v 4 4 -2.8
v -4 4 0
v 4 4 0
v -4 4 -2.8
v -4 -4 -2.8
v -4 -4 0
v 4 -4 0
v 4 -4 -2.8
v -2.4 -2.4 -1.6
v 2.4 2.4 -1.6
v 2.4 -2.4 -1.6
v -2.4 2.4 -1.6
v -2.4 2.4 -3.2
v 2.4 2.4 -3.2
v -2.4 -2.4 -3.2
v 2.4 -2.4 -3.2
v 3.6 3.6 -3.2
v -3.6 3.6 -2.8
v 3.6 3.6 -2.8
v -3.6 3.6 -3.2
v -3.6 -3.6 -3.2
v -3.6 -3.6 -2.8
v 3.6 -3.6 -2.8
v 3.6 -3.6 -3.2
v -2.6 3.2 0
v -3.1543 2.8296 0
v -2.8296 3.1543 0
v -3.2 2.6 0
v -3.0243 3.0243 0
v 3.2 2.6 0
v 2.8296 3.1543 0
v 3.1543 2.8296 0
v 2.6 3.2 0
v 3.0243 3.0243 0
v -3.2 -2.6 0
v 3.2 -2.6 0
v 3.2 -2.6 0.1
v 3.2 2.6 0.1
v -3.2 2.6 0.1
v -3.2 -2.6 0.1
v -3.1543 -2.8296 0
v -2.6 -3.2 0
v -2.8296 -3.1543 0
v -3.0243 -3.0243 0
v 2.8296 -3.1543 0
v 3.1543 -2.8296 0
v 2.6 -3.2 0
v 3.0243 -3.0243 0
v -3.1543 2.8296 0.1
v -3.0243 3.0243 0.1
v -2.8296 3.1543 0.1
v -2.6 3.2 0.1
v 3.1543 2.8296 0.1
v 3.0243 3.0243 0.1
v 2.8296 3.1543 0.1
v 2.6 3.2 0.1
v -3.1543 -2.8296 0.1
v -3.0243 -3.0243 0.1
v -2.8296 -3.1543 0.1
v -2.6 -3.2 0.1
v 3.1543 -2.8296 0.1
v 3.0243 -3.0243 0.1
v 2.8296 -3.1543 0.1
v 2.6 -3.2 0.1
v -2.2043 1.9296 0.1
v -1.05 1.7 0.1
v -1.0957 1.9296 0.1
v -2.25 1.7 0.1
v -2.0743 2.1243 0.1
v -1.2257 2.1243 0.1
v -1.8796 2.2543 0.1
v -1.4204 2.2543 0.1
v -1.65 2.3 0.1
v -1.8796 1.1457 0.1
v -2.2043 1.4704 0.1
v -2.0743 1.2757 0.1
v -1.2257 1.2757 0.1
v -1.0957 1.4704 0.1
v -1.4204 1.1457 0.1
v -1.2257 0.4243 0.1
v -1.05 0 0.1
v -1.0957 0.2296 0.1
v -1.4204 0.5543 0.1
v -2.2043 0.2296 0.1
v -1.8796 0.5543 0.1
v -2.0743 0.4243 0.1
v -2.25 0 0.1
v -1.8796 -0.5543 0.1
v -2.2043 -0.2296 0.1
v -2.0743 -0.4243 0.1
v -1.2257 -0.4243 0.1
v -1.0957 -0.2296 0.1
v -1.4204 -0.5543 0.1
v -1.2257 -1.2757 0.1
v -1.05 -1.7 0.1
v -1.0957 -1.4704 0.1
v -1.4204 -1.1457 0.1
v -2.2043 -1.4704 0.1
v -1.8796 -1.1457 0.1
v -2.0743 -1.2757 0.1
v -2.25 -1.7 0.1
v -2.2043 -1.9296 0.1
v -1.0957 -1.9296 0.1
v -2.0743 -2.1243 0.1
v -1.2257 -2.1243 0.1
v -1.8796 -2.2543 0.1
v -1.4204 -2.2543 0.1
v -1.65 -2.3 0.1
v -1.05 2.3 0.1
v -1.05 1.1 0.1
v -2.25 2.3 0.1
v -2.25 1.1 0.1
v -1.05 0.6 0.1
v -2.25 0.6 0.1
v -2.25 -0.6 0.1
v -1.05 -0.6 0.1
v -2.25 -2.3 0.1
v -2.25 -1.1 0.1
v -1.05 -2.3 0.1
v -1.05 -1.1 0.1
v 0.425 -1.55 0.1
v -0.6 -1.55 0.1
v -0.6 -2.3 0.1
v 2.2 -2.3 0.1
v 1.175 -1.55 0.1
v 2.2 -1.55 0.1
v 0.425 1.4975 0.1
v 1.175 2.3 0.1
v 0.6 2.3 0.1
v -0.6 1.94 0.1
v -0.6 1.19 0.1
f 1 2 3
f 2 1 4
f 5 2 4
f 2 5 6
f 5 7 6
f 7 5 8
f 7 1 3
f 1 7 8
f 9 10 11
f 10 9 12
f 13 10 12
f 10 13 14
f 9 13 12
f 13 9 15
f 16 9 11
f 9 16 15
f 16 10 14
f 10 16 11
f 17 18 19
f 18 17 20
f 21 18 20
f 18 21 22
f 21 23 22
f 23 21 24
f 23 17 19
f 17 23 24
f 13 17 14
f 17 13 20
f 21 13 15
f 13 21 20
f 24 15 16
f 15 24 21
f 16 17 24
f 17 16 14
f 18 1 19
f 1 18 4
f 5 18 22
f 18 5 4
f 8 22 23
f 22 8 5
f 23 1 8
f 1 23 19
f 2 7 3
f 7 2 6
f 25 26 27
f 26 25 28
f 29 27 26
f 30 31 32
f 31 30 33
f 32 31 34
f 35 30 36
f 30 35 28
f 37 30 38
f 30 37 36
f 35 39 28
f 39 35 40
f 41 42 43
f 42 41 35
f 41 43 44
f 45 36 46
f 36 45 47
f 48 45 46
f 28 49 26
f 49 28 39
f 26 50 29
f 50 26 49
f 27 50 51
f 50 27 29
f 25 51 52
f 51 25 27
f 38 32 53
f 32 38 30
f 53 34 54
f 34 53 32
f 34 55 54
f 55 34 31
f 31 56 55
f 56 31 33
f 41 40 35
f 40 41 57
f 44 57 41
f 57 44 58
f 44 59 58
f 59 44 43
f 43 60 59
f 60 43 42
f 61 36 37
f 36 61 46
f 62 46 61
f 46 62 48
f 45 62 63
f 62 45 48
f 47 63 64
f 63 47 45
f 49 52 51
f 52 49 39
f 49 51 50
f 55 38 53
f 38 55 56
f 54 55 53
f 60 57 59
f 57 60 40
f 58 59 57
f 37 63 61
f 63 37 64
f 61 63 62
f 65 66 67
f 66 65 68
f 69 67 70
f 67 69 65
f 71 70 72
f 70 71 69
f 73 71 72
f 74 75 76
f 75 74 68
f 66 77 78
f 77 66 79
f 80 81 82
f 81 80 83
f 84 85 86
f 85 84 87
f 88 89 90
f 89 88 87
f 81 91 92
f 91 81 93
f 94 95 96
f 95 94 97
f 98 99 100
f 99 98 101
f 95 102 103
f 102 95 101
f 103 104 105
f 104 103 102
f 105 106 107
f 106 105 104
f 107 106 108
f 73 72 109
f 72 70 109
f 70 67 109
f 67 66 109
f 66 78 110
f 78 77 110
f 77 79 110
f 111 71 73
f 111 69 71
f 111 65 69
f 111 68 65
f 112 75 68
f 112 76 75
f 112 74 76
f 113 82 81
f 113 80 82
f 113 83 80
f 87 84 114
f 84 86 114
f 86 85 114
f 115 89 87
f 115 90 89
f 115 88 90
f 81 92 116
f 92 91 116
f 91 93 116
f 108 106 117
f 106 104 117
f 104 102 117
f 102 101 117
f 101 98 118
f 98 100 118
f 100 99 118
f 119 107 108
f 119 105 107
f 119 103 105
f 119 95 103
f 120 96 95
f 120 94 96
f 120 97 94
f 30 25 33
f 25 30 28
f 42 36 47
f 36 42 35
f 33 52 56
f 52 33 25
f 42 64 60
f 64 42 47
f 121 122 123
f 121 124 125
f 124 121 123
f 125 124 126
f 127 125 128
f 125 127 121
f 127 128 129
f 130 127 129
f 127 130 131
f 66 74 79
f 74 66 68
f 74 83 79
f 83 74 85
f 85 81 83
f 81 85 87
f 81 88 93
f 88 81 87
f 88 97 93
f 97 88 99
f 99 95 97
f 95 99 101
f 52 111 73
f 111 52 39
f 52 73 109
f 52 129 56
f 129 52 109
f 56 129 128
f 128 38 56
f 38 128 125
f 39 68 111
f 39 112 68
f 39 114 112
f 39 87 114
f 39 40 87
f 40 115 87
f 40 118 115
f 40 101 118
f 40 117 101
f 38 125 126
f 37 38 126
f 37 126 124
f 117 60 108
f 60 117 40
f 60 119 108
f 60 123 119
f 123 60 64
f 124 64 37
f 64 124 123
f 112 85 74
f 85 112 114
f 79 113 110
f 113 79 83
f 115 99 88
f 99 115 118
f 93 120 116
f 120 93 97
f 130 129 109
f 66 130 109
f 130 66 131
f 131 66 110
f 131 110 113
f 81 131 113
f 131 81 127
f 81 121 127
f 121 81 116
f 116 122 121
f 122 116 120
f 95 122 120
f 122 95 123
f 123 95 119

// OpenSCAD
// file: ../p/box5.scad
use <../lib.scad>
function ldraw_lib__box5() = [
// 0 Box with 5 Faces and All Edges
// 0 Name: box5.dat
// 0 Author: James Jessiman
// 0 !LDRAW_ORG Primitive UPDATE 2012-01
// 0 !LICENSE Licensed under CC BY 4.0 : see CAreadme.txt
// 
// 0 BFC CERTIFY CCW
  [0,"BFC","CERTIFY"],
  [0,"BFC","CCW"],
// 
// 0 !HISTORY 2002-04-03 [sbliss] Modified for BFC compliance
// 0 !HISTORY 2002-04-25 [PTadmin] Official Update 2002-02
// 0 !HISTORY 2007-06-24 [PTadmin] Header formatted for Contributor Agreement
// 0 !HISTORY 2008-07-01 [PTadmin] Official Update 2008-01
// 0 !HISTORY 2012-02-16 [Philo] Changed to CCW
// 0 !HISTORY 2012-03-30 [PTadmin] Official Update 2012-01
// 
// 
// 2 24 1 1 1 -1 1 1
  [2,24,1,1,1,-1,1,1],
// 2 24 -1 1 1 -1 1 -1
  [2,24,-1,1,1,-1,1,-1],
// 2 24 -1 1 -1 1 1 -1
  [2,24,-1,1,-1,1,1,-1],
// 2 24 1 1 -1 1 1 1
  [2,24,1,1,-1,1,1,1],
// 2 24 1 0 1 -1 0 1
  [2,24,1,0,1,-1,0,1],
// 2 24 -1 0 1 -1 0 -1
  [2,24,-1,0,1,-1,0,-1],
// 2 24 -1 0 -1 1 0 -1
  [2,24,-1,0,-1,1,0,-1],
// 2 24 1 0 -1 1 0 1
  [2,24,1,0,-1,1,0,1],
// 2 24 1 0 1 1 1 1
  [2,24,1,0,1,1,1,1],
// 2 24 -1 0 1 -1 1 1
  [2,24,-1,0,1,-1,1,1],
// 2 24 1 0 -1 1 1 -1
  [2,24,1,0,-1,1,1,-1],
// 2 24 -1 0 -1 -1 1 -1
  [2,24,-1,0,-1,-1,1,-1],
// 4 16 -1 1 1 1 1 1 1 1 -1 -1 1 -1
  [4,16,-1,1,1,1,1,1,1,1,-1,-1,1,-1],
// 4 16 -1 1 1 -1 0 1 1 0 1 1 1 1
  [4,16,-1,1,1,-1,0,1,1,0,1,1,1,1],
// 4 16 -1 1 -1 -1 0 -1 -1 0 1 -1 1 1
  [4,16,-1,1,-1,-1,0,-1,-1,0,1,-1,1,1],
// 4 16 1 1 -1 1 0 -1 -1 0 -1 -1 1 -1
  [4,16,1,1,-1,1,0,-1,-1,0,-1,-1,1,-1],
// 4 16 1 1 1 1 0 1 1 0 -1 1 1 -1
  [4,16,1,1,1,1,0,1,1,0,-1,1,1,-1],
];
module ldraw_lib__box5(step=0, col=false, unit=2/5, alt=false, line=0.2, solid=!$preview)
    makepoly(ldraw_lib__box5(), step=step, col=col, unit=unit, alt=alt, line=line, solid=solid);
ldraw_lib__box5(line=0.2);
// file: ../p/box4.scad
use <../lib.scad>
function ldraw_lib__box4() = [
// 0 Box with 4 Faces (2 Parallel Pairs) and All Edges
// 0 Name: box4.dat
// 0 Author: James Jessiman
// 0 !LDRAW_ORG Primitive UPDATE 2012-01
// 0 !LICENSE Licensed under CC BY 4.0 : see CAreadme.txt
// 
// 0 BFC CERTIFY CCW
  [0,"BFC","CERTIFY"],
  [0,"BFC","CCW"],
// 
// 0 !HISTORY 2002-04-03 [sbliss] Modified for BFC compliance
// 0 !HISTORY 2002-04-25 [PTadmin] Official Update 2002-02
// 0 !HISTORY 2007-06-24 [PTadmin] Header formatted for Contributor Agreement
// 0 !HISTORY 2008-07-01 [PTadmin] Official Update 2008-01
// 0 !HISTORY 2012-02-16 [Philo] Changed to CCW
// 0 !HISTORY 2012-03-30 [PTadmin] Official Update 2012-01
// 
// 
// 2 24 1 1 1 -1 1 1
  [2,24,1,1,1,-1,1,1],
// 2 24 -1 1 1 -1 1 -1
  [2,24,-1,1,1,-1,1,-1],
// 2 24 -1 1 -1 1 1 -1
  [2,24,-1,1,-1,1,1,-1],
// 2 24 1 1 -1 1 1 1
  [2,24,1,1,-1,1,1,1],
// 2 24 1 0 1 -1 0 1
  [2,24,1,0,1,-1,0,1],
// 2 24 -1 0 1 -1 0 -1
  [2,24,-1,0,1,-1,0,-1],
// 2 24 -1 0 -1 1 0 -1
  [2,24,-1,0,-1,1,0,-1],
// 2 24 1 0 -1 1 0 1
  [2,24,1,0,-1,1,0,1],
// 2 24 1 0 1 1 1 1
  [2,24,1,0,1,1,1,1],
// 2 24 -1 0 1 -1 1 1
  [2,24,-1,0,1,-1,1,1],
// 2 24 1 0 -1 1 1 -1
  [2,24,1,0,-1,1,1,-1],
// 2 24 -1 0 -1 -1 1 -1
  [2,24,-1,0,-1,-1,1,-1],
// 4 16 -1 1 1 -1 0 1 1 0 1 1 1 1
  [4,16,-1,1,1,-1,0,1,1,0,1,1,1,1],
// 4 16 -1 1 -1 -1 0 -1 -1 0 1 -1 1 1
  [4,16,-1,1,-1,-1,0,-1,-1,0,1,-1,1,1],
// 4 16 1 1 -1 1 0 -1 -1 0 -1 -1 1 -1
  [4,16,1,1,-1,1,0,-1,-1,0,-1,-1,1,-1],
// 4 16 1 1 1 1 0 1 1 0 -1 1 1 -1
  [4,16,1,1,1,1,0,1,1,0,-1,1,1,-1],
];
module ldraw_lib__box4(step=0, col=false, unit=2/5, alt=false, line=0.2, solid=!$preview)
    makepoly(ldraw_lib__box4(), step=step, col=col, unit=unit, alt=alt, line=line, solid=solid);
ldraw_lib__box4(line=0.2);
// file: ../p/box3u12.scad
use <../lib.scad>
function ldraw_lib__box3u12() = [
// 0 Box with 3 Parallel Faces without Any Edges
// 0 Name: box3u12.dat
// 0 Author: J.C. Tchang [tchang]
// 0 !LDRAW_ORG Primitive UPDATE 2014-02
// 0 !LICENSE Licensed under CC BY 4.0 : see CAreadme.txt
// 
// 0 BFC CERTIFY CCW
  [0,"BFC","CERTIFY"],
  [0,"BFC","CCW"],
// 
// 0 !HISTORY 2014-12-23 [PTadmin] Official Update 2014-02
// 
// 
// 4 16 -1 1 1 1 1 1 1 1 -1 -1 1 -1
  [4,16,-1,1,1,1,1,1,1,1,-1,-1,1,-1],
// 4 16 -1 1 1 -1 0 1 1 0 1 1 1 1
  [4,16,-1,1,1,-1,0,1,1,0,1,1,1,1],
// 4 16 1 1 -1 1 0 -1 -1 0 -1 -1 1 -1
  [4,16,1,1,-1,1,0,-1,-1,0,-1,-1,1,-1],
];
module ldraw_lib__box3u12(step=0, col=false, unit=2/5, alt=false, line=0.2, solid=!$preview)
    makepoly(ldraw_lib__box3u12(), step=step, col=col, unit=unit, alt=alt, line=line, solid=solid);
ldraw_lib__box3u12(line=0.2);
// file: ../p/7-16ndis.scad
use <../lib.scad>
function ldraw_lib__7_16ndis() = [
// 0 Disc Negative 0.4375
// 0 Name: 7-16ndis.dat
// 0 Author: Alex Taylor [anathema]
// 0 !LDRAW_ORG Primitive UPDATE 2010-01
// 0 !LICENSE Licensed under CC BY 4.0 : see CAreadme.txt
// 
// 0 BFC CERTIFY CCW
  [0,"BFC","CERTIFY"],
  [0,"BFC","CCW"],
// 
// 0 !HISTORY 2010-04-05 [PTadmin] Official Update 2010-01
// 
// 
// 3 16 1 0 1 0.9239 0 0.3827 1 0 0
  [3,16,1,0,1,0.9239,0,0.3827,1,0,0],
// 3 16 1 0 1 0.7071 0 0.7071 0.9239 0 0.3827
  [3,16,1,0,1,0.7071,0,0.7071,0.9239,0,0.3827],
// 3 16 1 0 1 0.3827 0 0.9239 0.7071 0 0.7071
  [3,16,1,0,1,0.3827,0,0.9239,0.7071,0,0.7071],
// 3 16 1 0 1 0 0 1 0.3827 0 0.9239
  [3,16,1,0,1,0,0,1,0.3827,0,0.9239],
// 3 16 -1 0 1 -0.3827 0 0.9239 0 0 1
  [3,16,-1,0,1,-0.3827,0,0.9239,0,0,1],
// 3 16 -1 0 1 -0.7071 0 0.7071 -0.3827 0 0.9239
  [3,16,-1,0,1,-0.7071,0,0.7071,-0.3827,0,0.9239],
// 3 16 -1 0 1 -0.9239 0 0.3827 -0.7071 0 0.7071
  [3,16,-1,0,1,-0.9239,0,0.3827,-0.7071,0,0.7071],
// 0
];
module ldraw_lib__7_16ndis(step=0, col=false, unit=2/5, alt=false, line=0.2, solid=!$preview)
    makepoly(ldraw_lib__7_16ndis(), step=step, col=col, unit=unit, alt=alt, line=line, solid=solid);
ldraw_lib__7_16ndis(line=0.2);
// file: ../p/3-16ndis.scad
use <../lib.scad>
function ldraw_lib__3_16ndis() = [
// 0 Disc Negative 0.1875
// 0 Name: 3-16ndis.dat
// 0 Author: Magnus Forsberg [MagFors]
// 0 !LDRAW_ORG Primitive UPDATE 2024-01
// 0 !LICENSE Licensed under CC BY 4.0 : see CAreadme.txt
// 
// 0 BFC CERTIFY CCW
  [0,"BFC","CERTIFY"],
  [0,"BFC","CCW"],
// 
// 0 !HISTORY 2009-05-02 [PTadmin] Official Update 2009-01
// 0 !HISTORY 2024-01-03 [MagFors] Complete regeneration, original by guyvivan
// 0 !HISTORY 2024-01-29 [OrionP] Official Update 2024-01
// 
// 3 16 1 0 1 0.9239 0 0.3827 1 0 0
  [3,16,1,0,1,0.9239,0,0.3827,1,0,0],
// 3 16 1 0 1 0.7071 0 0.7071 0.9239 0 0.3827
  [3,16,1,0,1,0.7071,0,0.7071,0.9239,0,0.3827],
// 3 16 1 0 1 0.3827 0 0.9239 0.7071 0 0.7071
  [3,16,1,0,1,0.3827,0,0.9239,0.7071,0,0.7071],
// 0 // Build by LDPartEditor (PrimGen 2.X)
];
module ldraw_lib__3_16ndis(step=0, col=false, unit=2/5, alt=false, line=0.2, solid=!$preview)
    makepoly(ldraw_lib__3_16ndis(), step=step, col=col, unit=unit, alt=alt, line=line, solid=solid);
ldraw_lib__3_16ndis(line=0.2);
// file: ../p/3-16chrd.scad
use <../lib.scad>
function ldraw_lib__3_16chrd() = [
// 0 Chord 0.1875
// 0 Name: 3-16chrd.dat
// 0 Author: Niels Karsdorp [nielsk]
// 0 !LDRAW_ORG Primitive UPDATE 2009-01
// 0 !LICENSE Licensed under CC BY 4.0 : see CAreadme.txt
// 
// 0 BFC CERTIFY CCW
  [0,"BFC","CERTIFY"],
  [0,"BFC","CCW"],
// 
// 0 !HISTORY 2009-05-02 [PTadmin] Official Update 2009-01
// 
// 
// 4 16 1 0 0 0.9239 0 0.3827 0.7071 0 0.7071 0.3827 0 0.9239
  [4,16,1,0,0,0.9239,0,0.3827,0.7071,0,0.7071,0.3827,0,0.9239],
// 0
// 
];
module ldraw_lib__3_16chrd(step=0, col=false, unit=2/5, alt=false, line=0.2, solid=!$preview)
    makepoly(ldraw_lib__3_16chrd(), step=step, col=col, unit=unit, alt=alt, line=line, solid=solid);
ldraw_lib__3_16chrd(line=0.2);
// file: ../p/2-4chrd.scad
use <../lib.scad>
function ldraw_lib__2_4chrd() = [
// 0 Chord 0.5
// 0 Name: 2-4chrd.dat
// 0 Author: Philippe Hurbain [Philo]
// 0 !LDRAW_ORG Primitive UPDATE 2014-01
// 0 !LICENSE Licensed under CC BY 4.0 : see CAreadme.txt
// 
// 0 BFC CERTIFY CCW
  [0,"BFC","CERTIFY"],
  [0,"BFC","CCW"],
// 
// 0 !HISTORY 2014-06-21 [PTadmin] Official Update 2014-01
// 
// 
// 4 16 0.9239 0 0.3827 -0.9239 0 0.3827 -1 0 0 1 0 0
  [4,16,0.9239,0,0.3827,-0.9239,0,0.3827,-1,0,0,1,0,0],
// 4 16 0.7071 0 0.7071 -0.7071 0 0.7071 -0.9239 0 0.3827 0.9239 0 0.3827
  [4,16,0.7071,0,0.7071,-0.7071,0,0.7071,-0.9239,0,0.3827,0.9239,0,0.3827],
// 4 16 0.3827 0 0.9239 -0.3827 0 0.9239 -0.7071 0 0.7071 0.7071 0 0.7071
  [4,16,0.3827,0,0.9239,-0.3827,0,0.9239,-0.7071,0,0.7071,0.7071,0,0.7071],
// 3 16 0 0 1 -0.3827 0 0.9239 0.3827 0 0.9239
  [3,16,0,0,1,-0.3827,0,0.9239,0.3827,0,0.9239],
];
module ldraw_lib__2_4chrd(step=0, col=false, unit=2/5, alt=false, line=0.2, solid=!$preview)
    makepoly(ldraw_lib__2_4chrd(), step=step, col=col, unit=unit, alt=alt, line=line, solid=solid);
ldraw_lib__2_4chrd(line=0.2);
// file: ../p/1-4cyli.scad
use <../lib.scad>
function ldraw_lib__1_4cyli() = [
// 0 Cylinder 0.25
// 0 Name: 1-4cyli.dat
// 0 Author: James Jessiman
// 0 !LDRAW_ORG Primitive UPDATE 2012-01
// 0 !LICENSE Licensed under CC BY 4.0 : see CAreadme.txt
// 
// 0 BFC CERTIFY CCW
  [0,"BFC","CERTIFY"],
  [0,"BFC","CCW"],
// 
// 0 !HISTORY 2002-03-23 [sbliss] Added BFC statement.
// 0 !HISTORY 2002-04-25 [PTadmin] Official Update 2002-02
// 0 !HISTORY 2007-06-22 [PTadmin] Header formatted for Contributor Agreement
// 0 !HISTORY 2008-07-01 [PTadmin] Official Update 2008-01
// 0 !HISTORY 2012-02-16 [Philo] Changed to CCW
// 0 !HISTORY 2012-03-30 [PTadmin] Official Update 2012-01
// 
// 
// 4 16 1 1 0 0.9239 1 0.3827 0.9239 0 0.3827 1 0 0
  [4,16,1,1,0,0.9239,1,0.3827,0.9239,0,0.3827,1,0,0],
// 5 24 1 0 0 1 1 0 0.9239 0 0.3827 1 0 -1
  [5,24,1,0,0,1,1,0,0.9239,0,0.3827,1,0,-1],
// 4 16 0.9239 1 0.3827 0.7071 1 0.7071 0.7071 0 0.7071 0.9239 0 0.3827
  [4,16,0.9239,1,0.3827,0.7071,1,0.7071,0.7071,0,0.7071,0.9239,0,0.3827],
// 5 24 0.9239 0 0.3827 0.9239 1 0.3827 0.7071 0 0.7071 1 0 0
  [5,24,0.9239,0,0.3827,0.9239,1,0.3827,0.7071,0,0.7071,1,0,0],
// 4 16 0.7071 1 0.7071 0.3827 1 0.9239 0.3827 0 0.9239 0.7071 0 0.7071
  [4,16,0.7071,1,0.7071,0.3827,1,0.9239,0.3827,0,0.9239,0.7071,0,0.7071],
// 5 24 0.7071 0 0.7071 0.7071 1 0.7071 0.3827 0 0.9239 0.9239 0 0.3827
  [5,24,0.7071,0,0.7071,0.7071,1,0.7071,0.3827,0,0.9239,0.9239,0,0.3827],
// 4 16 0.3827 1 0.9239 0 1 1 0 0 1 0.3827 0 0.9239
  [4,16,0.3827,1,0.9239,0,1,1,0,0,1,0.3827,0,0.9239],
// 5 24 0.3827 0 0.9239 0.3827 1 0.9239 0 0 1 0.7071 0 0.7071
  [5,24,0.3827,0,0.9239,0.3827,1,0.9239,0,0,1,0.7071,0,0.7071],
// 5 24 0 0 1 0 1 1 0.3827 0 0.9239 -1 0 1
  [5,24,0,0,1,0,1,1,0.3827,0,0.9239,-1,0,1],
];
module ldraw_lib__1_4cyli(step=0, col=false, unit=2/5, alt=false, line=0.2, solid=!$preview)
    makepoly(ldraw_lib__1_4cyli(), step=step, col=col, unit=unit, alt=alt, line=line, solid=solid);
ldraw_lib__1_4cyli(line=0.2);
// file: ../p/1-4chrd.scad
use <../lib.scad>
function ldraw_lib__1_4chrd() = [
// 0 Chord 0.25
// 0 Name: 1-4chrd.dat
// 0 Author: Max Martin Richter [MMR1988]
// 0 !LDRAW_ORG Primitive UPDATE 2023-05
// 0 !LICENSE Licensed under CC BY 4.0 : see CAreadme.txt
// 
// 0 BFC CERTIFY CCW
  [0,"BFC","CERTIFY"],
  [0,"BFC","CCW"],
// 
// 0 !HISTORY 2004-04-22 [PTadmin] Official Update 2004-02
// 0 !HISTORY 2007-10-09 [PTadmin] Header formatted for Contributor Agreement
// 0 !HISTORY 2008-07-01 [PTadmin] Official Update 2008-01
// 0 !HISTORY 2012-08-02 [MMR1988] Re-creation with PrimGen2 and Rectifier
// 0 !HISTORY 2012-08-09 [PTadmin] Official Update 2012-02
// 0 !HISTORY 2023-10-27 [OrionP] Change author to MMR1988 from hafhead
// 0 !HISTORY 2023-10-31 [OrionP] Official Update 2023-05
// 
// 4 16 0.9239 0 0.3827 0.3827 0 0.9239 0 0 1 1 0 0
  [4,16,0.9239,0,0.3827,0.3827,0,0.9239,0,0,1,1,0,0],
// 3 16 0.7071 0 0.7071 0.3827 0 0.9239 0.9239 0 0.3827
  [3,16,0.7071,0,0.7071,0.3827,0,0.9239,0.9239,0,0.3827],
];
module ldraw_lib__1_4chrd(step=0, col=false, unit=2/5, alt=false, line=0.2, solid=!$preview)
    makepoly(ldraw_lib__1_4chrd(), step=step, col=col, unit=unit, alt=alt, line=line, solid=solid);
ldraw_lib__1_4chrd(line=0.2);
// file: s/3070bs01.scad
use <../../lib.scad>
use <../../p/box4.scad>
use <../../p/box5.scad>
function ldraw_lib__s__3070bs01() = [
// 0 ~Tile  1 x  1 with Groove without Top Face
// 0 Name: s\3070bs01.dat
// 0 Author: Chris Dee [cwdee]
// 0 !LDRAW_ORG Subpart UPDATE 2009-02
// 0 !LICENSE Licensed under CC BY 4.0 : see CAreadme.txt
// 
// 0 BFC CERTIFY CCW
  [0,"BFC","CERTIFY"],
  [0,"BFC","CCW"],
// 
// 0 !HISTORY 2009-09-03 [PTadmin] Official Update 2009-02
// 
// 
// 1 16 0 0 0 10 0 0 0 7 0 0 0 10 box4.dat
  [1,16,0,0,0,10,0,0,0,7,0,0,0,10, ldraw_lib__box4()],
// 0 BFC INVERTNEXT
  [0,"BFC","INVERTNEXT"],
// 1 16 0 8 0 6 0 0 0 -4 0 0 0 6 box5.dat
  [1,16,0,8,0,6,0,0,0,-4,0,0,0,6, ldraw_lib__box5()],
// 1 16 0 7 0 9 0 0 0 1 0 0 0 9 box4.dat
  [1,16,0,7,0,9,0,0,0,1,0,0,0,9, ldraw_lib__box4()],
// 
// 4 16 9 8 9 6 8 6 -6 8 6 -9 8 9
  [4,16,9,8,9,6,8,6,-6,8,6,-9,8,9],
// 4 16 -9 8 9 -6 8 6 -6 8 -6 -9 8 -9
  [4,16,-9,8,9,-6,8,6,-6,8,-6,-9,8,-9],
// 4 16 -9 8 -9 -6 8 -6 6 8 -6 9 8 -9
  [4,16,-9,8,-9,-6,8,-6,6,8,-6,9,8,-9],
// 4 16 9 8 -9 6 8 -6 6 8 6 9 8 9
  [4,16,9,8,-9,6,8,-6,6,8,6,9,8,9],
// 
// 4 16 10 7 10 9 7 9 -9 7 9 -10 7 10
  [4,16,10,7,10,9,7,9,-9,7,9,-10,7,10],
// 4 16 -10 7 10 -9 7 9 -9 7 -9 -10 7 -10
  [4,16,-10,7,10,-9,7,9,-9,7,-9,-10,7,-10],
// 4 16 -10 7 -10 -9 7 -9 9 7 -9 10 7 -10
  [4,16,-10,7,-10,-9,7,-9,9,7,-9,10,7,-10],
// 4 16 10 7 -10 9 7 -9 9 7 9 10 7 10
  [4,16,10,7,-10,9,7,-9,9,7,9,10,7,10],
// 0
];
module ldraw_lib__s__3070bs01(step=0, col=false, unit=2/5, alt=false, line=0.2, solid=!$preview)
    makepoly(ldraw_lib__s__3070bs01(), step=step, col=col, unit=unit, alt=alt, line=line, solid=solid);
ldraw_lib__s__3070bs01(line=0.2);
// file: 3070b.scad
use <../lib.scad>
use <s/3070bs01.scad>
function ldraw_lib__3070b() = [
// 0 Tile  1 x  1 with Groove
// 0 Name: 3070b.dat
// 0 Author: Chris Dee [cwdee]
// 0 !LDRAW_ORG Part UPDATE 2025-09
// 0 !LICENSE Licensed under CC BY 4.0 : see CAreadme.txt
// 
// 0 BFC CERTIFY CCW
  [0,"BFC","CERTIFY"],
  [0,"BFC","CCW"],
// 
// 0 !KEYWORDS BrickLink 3070
// 
// 0 !HISTORY 2009-09-03 [PTadmin] Official Update 2009-02
// 0 !HISTORY 2025-09-27 [OrionP] Changed winding to CCW
// 0 !HISTORY 2025-09-29 [OrionP] Official Update 2025-09
// 
// 1 16 0 0 0 1 0 0 0 1 0 0 0 1 s\3070bs01.dat
  [1,16,0,0,0,1,0,0,0,1,0,0,0,1, ldraw_lib__s__3070bs01()],
// 4 16 -10 0 10 -10 0 -10 10 0 -10 10 0 10
  [4,16,-10,0,10,-10,0,-10,10,0,-10,10,0,10],
// 0
];
module ldraw_lib__3070b(step=0, col=false, unit=2/5, alt=false, line=0.2, solid=!$preview)
    makepoly(ldraw_lib__3070b(), step=step, col=col, unit=unit, alt=alt, line=line, solid=solid);
ldraw_lib__3070b(line=0.2);
// main file
use <../lib.scad>
use <3070b.scad>
use <6142275d.scad>
function ldraw_lib__3070bd05() = [
// 0 Tile  1 x  1 with White Number 1 and  3 Dark Grey Circles Left on Red Background Sticker
// 0 Name: 3070bd05.dat
// 0 Author: Vincent Messenet [Cheenzo]
// 0 !LDRAW_ORG Shortcut UPDATE 2026-05
// 0 !LICENSE Licensed under CC BY 4.0 : see CAreadme.txt
// 
// 0 BFC CERTIFY CCW
  [0,"BFC","CERTIFY"],
  [0,"BFC","CCW"],
// 
// 0 !CATEGORY Sticker Shortcut
// 
// 0 !KEYWORDS Bricklink 3070pb266R, Set 75872
// 
// 0 !HISTORY 2026-05-31 [OrionP] Official Update 2026-05
// 
// 1 16 0 0 0 1 0 0 0 1 0 0 0 1 3070b.dat
  [1,16,0,0,0,1,0,0,0,1,0,0,0,1, ldraw_lib__3070b()],
// 1 16 0 0 0 1 0 0 0 1 0 0 0 1 6142275d.dat
  [1,16,0,0,0,1,0,0,0,1,0,0,0,1, ldraw_lib__6142275d()],
];
module ldraw_lib__3070bd05(step=0, col=false, unit=2/5, alt=false, line=0.2, solid=!$preview)
    makepoly(ldraw_lib__3070bd05(), step=step, col=col, unit=unit, alt=alt, line=line, solid=solid);
ldraw_lib__3070bd05(line=0.2);
